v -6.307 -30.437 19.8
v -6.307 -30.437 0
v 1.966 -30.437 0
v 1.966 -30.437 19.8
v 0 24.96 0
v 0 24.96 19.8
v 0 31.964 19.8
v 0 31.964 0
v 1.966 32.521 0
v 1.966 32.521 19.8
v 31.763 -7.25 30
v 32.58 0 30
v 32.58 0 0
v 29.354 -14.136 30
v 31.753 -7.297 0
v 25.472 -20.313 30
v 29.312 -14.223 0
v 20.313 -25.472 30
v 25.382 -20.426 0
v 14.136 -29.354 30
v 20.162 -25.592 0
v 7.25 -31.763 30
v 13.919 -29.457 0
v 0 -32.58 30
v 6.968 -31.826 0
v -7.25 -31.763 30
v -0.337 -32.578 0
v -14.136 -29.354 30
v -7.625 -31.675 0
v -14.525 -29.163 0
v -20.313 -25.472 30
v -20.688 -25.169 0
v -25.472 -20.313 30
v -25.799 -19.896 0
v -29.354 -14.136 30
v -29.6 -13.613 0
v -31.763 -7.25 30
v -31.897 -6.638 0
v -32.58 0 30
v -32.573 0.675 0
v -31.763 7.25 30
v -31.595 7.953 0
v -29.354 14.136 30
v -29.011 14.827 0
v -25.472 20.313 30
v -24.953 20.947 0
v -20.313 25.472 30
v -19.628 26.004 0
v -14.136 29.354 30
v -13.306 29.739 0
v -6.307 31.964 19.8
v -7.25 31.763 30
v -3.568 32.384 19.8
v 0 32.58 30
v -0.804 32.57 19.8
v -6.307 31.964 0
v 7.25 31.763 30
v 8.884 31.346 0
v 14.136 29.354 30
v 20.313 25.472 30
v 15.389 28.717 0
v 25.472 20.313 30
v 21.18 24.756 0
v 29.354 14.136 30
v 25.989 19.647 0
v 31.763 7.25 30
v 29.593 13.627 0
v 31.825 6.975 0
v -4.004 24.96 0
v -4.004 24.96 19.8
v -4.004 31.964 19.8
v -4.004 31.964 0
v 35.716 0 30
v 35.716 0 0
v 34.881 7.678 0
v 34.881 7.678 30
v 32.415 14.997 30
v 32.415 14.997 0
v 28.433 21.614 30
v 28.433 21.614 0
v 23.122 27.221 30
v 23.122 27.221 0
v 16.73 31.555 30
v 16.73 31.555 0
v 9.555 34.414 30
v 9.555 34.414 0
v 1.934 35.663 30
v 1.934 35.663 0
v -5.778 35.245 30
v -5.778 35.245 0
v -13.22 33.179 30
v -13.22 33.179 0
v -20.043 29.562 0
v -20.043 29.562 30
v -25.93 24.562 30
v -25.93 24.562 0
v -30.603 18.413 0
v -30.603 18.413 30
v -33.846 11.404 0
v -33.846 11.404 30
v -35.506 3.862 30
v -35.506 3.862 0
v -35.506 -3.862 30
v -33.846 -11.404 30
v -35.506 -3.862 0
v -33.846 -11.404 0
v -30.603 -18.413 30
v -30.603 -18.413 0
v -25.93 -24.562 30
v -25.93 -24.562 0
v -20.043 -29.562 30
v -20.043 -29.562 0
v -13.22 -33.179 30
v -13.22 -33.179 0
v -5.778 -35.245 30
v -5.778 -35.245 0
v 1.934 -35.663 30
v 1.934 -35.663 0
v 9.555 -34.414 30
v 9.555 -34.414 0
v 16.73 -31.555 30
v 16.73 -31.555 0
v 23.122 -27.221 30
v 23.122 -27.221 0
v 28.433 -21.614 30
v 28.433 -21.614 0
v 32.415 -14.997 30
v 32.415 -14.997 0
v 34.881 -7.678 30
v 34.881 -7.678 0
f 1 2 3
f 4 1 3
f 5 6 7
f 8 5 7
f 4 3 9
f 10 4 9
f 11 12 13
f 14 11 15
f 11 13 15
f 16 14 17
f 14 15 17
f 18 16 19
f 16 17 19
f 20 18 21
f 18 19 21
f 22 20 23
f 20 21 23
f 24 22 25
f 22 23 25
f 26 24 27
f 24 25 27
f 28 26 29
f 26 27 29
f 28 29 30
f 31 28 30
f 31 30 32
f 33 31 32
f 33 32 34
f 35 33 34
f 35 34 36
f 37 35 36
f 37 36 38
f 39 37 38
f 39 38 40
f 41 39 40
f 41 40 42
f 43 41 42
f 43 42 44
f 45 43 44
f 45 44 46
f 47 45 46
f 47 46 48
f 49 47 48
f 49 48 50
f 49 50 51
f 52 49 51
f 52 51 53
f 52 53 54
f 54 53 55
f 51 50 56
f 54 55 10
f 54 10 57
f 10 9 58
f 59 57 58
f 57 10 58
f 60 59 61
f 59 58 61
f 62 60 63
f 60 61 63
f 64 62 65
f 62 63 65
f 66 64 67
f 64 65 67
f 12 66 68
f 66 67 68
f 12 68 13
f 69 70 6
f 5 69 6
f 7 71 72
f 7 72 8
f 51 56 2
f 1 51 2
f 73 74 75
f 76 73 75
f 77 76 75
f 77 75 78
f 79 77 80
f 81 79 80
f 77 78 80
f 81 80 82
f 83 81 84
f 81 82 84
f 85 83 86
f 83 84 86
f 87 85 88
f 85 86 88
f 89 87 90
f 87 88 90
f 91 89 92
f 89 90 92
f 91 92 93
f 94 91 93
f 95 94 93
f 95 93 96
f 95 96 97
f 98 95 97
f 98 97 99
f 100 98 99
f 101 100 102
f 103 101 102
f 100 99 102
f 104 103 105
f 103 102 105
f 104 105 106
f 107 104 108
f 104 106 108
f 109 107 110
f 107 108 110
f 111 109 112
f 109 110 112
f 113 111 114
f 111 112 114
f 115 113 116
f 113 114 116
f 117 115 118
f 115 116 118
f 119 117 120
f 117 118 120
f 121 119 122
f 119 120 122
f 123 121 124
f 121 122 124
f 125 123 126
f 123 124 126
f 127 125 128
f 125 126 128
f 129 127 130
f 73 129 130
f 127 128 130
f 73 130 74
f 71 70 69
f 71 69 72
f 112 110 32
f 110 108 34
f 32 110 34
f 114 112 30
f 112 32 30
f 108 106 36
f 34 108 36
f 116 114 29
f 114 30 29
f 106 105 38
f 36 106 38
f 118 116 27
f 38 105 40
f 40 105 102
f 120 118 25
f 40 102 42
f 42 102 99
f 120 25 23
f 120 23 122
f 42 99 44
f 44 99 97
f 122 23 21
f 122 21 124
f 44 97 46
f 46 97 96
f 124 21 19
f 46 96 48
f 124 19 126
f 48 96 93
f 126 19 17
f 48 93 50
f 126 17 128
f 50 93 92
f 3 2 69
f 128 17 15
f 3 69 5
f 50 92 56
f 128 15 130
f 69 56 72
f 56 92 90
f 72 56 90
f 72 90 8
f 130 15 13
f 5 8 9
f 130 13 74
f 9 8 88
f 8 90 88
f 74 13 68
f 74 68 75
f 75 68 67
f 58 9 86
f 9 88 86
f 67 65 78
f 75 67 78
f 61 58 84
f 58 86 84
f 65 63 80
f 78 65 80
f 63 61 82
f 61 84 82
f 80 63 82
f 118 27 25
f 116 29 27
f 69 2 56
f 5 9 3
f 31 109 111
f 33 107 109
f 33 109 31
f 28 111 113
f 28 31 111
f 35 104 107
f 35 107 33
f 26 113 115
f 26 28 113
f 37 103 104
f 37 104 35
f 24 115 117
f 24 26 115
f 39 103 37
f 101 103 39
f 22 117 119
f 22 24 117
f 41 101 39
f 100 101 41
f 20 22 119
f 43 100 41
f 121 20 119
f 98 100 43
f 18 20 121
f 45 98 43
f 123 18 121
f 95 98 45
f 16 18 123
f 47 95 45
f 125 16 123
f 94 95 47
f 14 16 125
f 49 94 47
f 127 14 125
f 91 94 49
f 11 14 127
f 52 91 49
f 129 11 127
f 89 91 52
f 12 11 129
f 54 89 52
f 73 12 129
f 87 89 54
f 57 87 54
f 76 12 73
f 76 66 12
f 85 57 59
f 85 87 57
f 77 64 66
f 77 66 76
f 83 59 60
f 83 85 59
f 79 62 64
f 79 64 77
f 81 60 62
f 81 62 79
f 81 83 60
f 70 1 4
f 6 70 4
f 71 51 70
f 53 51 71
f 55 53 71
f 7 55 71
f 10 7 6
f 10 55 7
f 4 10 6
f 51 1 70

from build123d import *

# Parameters (mm, degrees)
F0_R     = 35.715838
F1_DEPTH = 30
F2_R     = 32.580129
F3_DEPTH = 149
F5_DEPTH = 19.8
F6_W     = 4.003989
F6_H     = 7.003708
F7_DEPTH = 120.5


with BuildPart() as f1:
    # F0 (on Top) → F1 (new body)
    with BuildSketch(Plane.XY):
        Circle(F0_R)
    extrude(amount=F1_DEPTH)

    # F2 (on face) → F3 (cut)
    with BuildSketch(Plane(origin=(0, 0, 0), x_dir=(1, 0, 0), z_dir=(0, 0, -1))):
        Circle(F2_R)
    extrude(amount=-F3_DEPTH, mode=Mode.SUBTRACT)

    # F4 (on Top) → F5 (join)
    with BuildSketch(Plane.XY):
        Polygon((1.966494, 35.009865), (-6.307223, 34.134421), (-6.307223, -30.437076), (1.966494, -30.437076), align=None)
    extrude(amount=F5_DEPTH)

    # F6 (on face) → F7 (cut)
    with BuildSketch(Plane.XY.offset(19.8)):
        with Locations((-2.001994, 28.461934)):
            Rectangle(F6_W, F6_H)
    extrude(amount=-F7_DEPTH, mode=Mode.SUBTRACT)


solid = f1.part
